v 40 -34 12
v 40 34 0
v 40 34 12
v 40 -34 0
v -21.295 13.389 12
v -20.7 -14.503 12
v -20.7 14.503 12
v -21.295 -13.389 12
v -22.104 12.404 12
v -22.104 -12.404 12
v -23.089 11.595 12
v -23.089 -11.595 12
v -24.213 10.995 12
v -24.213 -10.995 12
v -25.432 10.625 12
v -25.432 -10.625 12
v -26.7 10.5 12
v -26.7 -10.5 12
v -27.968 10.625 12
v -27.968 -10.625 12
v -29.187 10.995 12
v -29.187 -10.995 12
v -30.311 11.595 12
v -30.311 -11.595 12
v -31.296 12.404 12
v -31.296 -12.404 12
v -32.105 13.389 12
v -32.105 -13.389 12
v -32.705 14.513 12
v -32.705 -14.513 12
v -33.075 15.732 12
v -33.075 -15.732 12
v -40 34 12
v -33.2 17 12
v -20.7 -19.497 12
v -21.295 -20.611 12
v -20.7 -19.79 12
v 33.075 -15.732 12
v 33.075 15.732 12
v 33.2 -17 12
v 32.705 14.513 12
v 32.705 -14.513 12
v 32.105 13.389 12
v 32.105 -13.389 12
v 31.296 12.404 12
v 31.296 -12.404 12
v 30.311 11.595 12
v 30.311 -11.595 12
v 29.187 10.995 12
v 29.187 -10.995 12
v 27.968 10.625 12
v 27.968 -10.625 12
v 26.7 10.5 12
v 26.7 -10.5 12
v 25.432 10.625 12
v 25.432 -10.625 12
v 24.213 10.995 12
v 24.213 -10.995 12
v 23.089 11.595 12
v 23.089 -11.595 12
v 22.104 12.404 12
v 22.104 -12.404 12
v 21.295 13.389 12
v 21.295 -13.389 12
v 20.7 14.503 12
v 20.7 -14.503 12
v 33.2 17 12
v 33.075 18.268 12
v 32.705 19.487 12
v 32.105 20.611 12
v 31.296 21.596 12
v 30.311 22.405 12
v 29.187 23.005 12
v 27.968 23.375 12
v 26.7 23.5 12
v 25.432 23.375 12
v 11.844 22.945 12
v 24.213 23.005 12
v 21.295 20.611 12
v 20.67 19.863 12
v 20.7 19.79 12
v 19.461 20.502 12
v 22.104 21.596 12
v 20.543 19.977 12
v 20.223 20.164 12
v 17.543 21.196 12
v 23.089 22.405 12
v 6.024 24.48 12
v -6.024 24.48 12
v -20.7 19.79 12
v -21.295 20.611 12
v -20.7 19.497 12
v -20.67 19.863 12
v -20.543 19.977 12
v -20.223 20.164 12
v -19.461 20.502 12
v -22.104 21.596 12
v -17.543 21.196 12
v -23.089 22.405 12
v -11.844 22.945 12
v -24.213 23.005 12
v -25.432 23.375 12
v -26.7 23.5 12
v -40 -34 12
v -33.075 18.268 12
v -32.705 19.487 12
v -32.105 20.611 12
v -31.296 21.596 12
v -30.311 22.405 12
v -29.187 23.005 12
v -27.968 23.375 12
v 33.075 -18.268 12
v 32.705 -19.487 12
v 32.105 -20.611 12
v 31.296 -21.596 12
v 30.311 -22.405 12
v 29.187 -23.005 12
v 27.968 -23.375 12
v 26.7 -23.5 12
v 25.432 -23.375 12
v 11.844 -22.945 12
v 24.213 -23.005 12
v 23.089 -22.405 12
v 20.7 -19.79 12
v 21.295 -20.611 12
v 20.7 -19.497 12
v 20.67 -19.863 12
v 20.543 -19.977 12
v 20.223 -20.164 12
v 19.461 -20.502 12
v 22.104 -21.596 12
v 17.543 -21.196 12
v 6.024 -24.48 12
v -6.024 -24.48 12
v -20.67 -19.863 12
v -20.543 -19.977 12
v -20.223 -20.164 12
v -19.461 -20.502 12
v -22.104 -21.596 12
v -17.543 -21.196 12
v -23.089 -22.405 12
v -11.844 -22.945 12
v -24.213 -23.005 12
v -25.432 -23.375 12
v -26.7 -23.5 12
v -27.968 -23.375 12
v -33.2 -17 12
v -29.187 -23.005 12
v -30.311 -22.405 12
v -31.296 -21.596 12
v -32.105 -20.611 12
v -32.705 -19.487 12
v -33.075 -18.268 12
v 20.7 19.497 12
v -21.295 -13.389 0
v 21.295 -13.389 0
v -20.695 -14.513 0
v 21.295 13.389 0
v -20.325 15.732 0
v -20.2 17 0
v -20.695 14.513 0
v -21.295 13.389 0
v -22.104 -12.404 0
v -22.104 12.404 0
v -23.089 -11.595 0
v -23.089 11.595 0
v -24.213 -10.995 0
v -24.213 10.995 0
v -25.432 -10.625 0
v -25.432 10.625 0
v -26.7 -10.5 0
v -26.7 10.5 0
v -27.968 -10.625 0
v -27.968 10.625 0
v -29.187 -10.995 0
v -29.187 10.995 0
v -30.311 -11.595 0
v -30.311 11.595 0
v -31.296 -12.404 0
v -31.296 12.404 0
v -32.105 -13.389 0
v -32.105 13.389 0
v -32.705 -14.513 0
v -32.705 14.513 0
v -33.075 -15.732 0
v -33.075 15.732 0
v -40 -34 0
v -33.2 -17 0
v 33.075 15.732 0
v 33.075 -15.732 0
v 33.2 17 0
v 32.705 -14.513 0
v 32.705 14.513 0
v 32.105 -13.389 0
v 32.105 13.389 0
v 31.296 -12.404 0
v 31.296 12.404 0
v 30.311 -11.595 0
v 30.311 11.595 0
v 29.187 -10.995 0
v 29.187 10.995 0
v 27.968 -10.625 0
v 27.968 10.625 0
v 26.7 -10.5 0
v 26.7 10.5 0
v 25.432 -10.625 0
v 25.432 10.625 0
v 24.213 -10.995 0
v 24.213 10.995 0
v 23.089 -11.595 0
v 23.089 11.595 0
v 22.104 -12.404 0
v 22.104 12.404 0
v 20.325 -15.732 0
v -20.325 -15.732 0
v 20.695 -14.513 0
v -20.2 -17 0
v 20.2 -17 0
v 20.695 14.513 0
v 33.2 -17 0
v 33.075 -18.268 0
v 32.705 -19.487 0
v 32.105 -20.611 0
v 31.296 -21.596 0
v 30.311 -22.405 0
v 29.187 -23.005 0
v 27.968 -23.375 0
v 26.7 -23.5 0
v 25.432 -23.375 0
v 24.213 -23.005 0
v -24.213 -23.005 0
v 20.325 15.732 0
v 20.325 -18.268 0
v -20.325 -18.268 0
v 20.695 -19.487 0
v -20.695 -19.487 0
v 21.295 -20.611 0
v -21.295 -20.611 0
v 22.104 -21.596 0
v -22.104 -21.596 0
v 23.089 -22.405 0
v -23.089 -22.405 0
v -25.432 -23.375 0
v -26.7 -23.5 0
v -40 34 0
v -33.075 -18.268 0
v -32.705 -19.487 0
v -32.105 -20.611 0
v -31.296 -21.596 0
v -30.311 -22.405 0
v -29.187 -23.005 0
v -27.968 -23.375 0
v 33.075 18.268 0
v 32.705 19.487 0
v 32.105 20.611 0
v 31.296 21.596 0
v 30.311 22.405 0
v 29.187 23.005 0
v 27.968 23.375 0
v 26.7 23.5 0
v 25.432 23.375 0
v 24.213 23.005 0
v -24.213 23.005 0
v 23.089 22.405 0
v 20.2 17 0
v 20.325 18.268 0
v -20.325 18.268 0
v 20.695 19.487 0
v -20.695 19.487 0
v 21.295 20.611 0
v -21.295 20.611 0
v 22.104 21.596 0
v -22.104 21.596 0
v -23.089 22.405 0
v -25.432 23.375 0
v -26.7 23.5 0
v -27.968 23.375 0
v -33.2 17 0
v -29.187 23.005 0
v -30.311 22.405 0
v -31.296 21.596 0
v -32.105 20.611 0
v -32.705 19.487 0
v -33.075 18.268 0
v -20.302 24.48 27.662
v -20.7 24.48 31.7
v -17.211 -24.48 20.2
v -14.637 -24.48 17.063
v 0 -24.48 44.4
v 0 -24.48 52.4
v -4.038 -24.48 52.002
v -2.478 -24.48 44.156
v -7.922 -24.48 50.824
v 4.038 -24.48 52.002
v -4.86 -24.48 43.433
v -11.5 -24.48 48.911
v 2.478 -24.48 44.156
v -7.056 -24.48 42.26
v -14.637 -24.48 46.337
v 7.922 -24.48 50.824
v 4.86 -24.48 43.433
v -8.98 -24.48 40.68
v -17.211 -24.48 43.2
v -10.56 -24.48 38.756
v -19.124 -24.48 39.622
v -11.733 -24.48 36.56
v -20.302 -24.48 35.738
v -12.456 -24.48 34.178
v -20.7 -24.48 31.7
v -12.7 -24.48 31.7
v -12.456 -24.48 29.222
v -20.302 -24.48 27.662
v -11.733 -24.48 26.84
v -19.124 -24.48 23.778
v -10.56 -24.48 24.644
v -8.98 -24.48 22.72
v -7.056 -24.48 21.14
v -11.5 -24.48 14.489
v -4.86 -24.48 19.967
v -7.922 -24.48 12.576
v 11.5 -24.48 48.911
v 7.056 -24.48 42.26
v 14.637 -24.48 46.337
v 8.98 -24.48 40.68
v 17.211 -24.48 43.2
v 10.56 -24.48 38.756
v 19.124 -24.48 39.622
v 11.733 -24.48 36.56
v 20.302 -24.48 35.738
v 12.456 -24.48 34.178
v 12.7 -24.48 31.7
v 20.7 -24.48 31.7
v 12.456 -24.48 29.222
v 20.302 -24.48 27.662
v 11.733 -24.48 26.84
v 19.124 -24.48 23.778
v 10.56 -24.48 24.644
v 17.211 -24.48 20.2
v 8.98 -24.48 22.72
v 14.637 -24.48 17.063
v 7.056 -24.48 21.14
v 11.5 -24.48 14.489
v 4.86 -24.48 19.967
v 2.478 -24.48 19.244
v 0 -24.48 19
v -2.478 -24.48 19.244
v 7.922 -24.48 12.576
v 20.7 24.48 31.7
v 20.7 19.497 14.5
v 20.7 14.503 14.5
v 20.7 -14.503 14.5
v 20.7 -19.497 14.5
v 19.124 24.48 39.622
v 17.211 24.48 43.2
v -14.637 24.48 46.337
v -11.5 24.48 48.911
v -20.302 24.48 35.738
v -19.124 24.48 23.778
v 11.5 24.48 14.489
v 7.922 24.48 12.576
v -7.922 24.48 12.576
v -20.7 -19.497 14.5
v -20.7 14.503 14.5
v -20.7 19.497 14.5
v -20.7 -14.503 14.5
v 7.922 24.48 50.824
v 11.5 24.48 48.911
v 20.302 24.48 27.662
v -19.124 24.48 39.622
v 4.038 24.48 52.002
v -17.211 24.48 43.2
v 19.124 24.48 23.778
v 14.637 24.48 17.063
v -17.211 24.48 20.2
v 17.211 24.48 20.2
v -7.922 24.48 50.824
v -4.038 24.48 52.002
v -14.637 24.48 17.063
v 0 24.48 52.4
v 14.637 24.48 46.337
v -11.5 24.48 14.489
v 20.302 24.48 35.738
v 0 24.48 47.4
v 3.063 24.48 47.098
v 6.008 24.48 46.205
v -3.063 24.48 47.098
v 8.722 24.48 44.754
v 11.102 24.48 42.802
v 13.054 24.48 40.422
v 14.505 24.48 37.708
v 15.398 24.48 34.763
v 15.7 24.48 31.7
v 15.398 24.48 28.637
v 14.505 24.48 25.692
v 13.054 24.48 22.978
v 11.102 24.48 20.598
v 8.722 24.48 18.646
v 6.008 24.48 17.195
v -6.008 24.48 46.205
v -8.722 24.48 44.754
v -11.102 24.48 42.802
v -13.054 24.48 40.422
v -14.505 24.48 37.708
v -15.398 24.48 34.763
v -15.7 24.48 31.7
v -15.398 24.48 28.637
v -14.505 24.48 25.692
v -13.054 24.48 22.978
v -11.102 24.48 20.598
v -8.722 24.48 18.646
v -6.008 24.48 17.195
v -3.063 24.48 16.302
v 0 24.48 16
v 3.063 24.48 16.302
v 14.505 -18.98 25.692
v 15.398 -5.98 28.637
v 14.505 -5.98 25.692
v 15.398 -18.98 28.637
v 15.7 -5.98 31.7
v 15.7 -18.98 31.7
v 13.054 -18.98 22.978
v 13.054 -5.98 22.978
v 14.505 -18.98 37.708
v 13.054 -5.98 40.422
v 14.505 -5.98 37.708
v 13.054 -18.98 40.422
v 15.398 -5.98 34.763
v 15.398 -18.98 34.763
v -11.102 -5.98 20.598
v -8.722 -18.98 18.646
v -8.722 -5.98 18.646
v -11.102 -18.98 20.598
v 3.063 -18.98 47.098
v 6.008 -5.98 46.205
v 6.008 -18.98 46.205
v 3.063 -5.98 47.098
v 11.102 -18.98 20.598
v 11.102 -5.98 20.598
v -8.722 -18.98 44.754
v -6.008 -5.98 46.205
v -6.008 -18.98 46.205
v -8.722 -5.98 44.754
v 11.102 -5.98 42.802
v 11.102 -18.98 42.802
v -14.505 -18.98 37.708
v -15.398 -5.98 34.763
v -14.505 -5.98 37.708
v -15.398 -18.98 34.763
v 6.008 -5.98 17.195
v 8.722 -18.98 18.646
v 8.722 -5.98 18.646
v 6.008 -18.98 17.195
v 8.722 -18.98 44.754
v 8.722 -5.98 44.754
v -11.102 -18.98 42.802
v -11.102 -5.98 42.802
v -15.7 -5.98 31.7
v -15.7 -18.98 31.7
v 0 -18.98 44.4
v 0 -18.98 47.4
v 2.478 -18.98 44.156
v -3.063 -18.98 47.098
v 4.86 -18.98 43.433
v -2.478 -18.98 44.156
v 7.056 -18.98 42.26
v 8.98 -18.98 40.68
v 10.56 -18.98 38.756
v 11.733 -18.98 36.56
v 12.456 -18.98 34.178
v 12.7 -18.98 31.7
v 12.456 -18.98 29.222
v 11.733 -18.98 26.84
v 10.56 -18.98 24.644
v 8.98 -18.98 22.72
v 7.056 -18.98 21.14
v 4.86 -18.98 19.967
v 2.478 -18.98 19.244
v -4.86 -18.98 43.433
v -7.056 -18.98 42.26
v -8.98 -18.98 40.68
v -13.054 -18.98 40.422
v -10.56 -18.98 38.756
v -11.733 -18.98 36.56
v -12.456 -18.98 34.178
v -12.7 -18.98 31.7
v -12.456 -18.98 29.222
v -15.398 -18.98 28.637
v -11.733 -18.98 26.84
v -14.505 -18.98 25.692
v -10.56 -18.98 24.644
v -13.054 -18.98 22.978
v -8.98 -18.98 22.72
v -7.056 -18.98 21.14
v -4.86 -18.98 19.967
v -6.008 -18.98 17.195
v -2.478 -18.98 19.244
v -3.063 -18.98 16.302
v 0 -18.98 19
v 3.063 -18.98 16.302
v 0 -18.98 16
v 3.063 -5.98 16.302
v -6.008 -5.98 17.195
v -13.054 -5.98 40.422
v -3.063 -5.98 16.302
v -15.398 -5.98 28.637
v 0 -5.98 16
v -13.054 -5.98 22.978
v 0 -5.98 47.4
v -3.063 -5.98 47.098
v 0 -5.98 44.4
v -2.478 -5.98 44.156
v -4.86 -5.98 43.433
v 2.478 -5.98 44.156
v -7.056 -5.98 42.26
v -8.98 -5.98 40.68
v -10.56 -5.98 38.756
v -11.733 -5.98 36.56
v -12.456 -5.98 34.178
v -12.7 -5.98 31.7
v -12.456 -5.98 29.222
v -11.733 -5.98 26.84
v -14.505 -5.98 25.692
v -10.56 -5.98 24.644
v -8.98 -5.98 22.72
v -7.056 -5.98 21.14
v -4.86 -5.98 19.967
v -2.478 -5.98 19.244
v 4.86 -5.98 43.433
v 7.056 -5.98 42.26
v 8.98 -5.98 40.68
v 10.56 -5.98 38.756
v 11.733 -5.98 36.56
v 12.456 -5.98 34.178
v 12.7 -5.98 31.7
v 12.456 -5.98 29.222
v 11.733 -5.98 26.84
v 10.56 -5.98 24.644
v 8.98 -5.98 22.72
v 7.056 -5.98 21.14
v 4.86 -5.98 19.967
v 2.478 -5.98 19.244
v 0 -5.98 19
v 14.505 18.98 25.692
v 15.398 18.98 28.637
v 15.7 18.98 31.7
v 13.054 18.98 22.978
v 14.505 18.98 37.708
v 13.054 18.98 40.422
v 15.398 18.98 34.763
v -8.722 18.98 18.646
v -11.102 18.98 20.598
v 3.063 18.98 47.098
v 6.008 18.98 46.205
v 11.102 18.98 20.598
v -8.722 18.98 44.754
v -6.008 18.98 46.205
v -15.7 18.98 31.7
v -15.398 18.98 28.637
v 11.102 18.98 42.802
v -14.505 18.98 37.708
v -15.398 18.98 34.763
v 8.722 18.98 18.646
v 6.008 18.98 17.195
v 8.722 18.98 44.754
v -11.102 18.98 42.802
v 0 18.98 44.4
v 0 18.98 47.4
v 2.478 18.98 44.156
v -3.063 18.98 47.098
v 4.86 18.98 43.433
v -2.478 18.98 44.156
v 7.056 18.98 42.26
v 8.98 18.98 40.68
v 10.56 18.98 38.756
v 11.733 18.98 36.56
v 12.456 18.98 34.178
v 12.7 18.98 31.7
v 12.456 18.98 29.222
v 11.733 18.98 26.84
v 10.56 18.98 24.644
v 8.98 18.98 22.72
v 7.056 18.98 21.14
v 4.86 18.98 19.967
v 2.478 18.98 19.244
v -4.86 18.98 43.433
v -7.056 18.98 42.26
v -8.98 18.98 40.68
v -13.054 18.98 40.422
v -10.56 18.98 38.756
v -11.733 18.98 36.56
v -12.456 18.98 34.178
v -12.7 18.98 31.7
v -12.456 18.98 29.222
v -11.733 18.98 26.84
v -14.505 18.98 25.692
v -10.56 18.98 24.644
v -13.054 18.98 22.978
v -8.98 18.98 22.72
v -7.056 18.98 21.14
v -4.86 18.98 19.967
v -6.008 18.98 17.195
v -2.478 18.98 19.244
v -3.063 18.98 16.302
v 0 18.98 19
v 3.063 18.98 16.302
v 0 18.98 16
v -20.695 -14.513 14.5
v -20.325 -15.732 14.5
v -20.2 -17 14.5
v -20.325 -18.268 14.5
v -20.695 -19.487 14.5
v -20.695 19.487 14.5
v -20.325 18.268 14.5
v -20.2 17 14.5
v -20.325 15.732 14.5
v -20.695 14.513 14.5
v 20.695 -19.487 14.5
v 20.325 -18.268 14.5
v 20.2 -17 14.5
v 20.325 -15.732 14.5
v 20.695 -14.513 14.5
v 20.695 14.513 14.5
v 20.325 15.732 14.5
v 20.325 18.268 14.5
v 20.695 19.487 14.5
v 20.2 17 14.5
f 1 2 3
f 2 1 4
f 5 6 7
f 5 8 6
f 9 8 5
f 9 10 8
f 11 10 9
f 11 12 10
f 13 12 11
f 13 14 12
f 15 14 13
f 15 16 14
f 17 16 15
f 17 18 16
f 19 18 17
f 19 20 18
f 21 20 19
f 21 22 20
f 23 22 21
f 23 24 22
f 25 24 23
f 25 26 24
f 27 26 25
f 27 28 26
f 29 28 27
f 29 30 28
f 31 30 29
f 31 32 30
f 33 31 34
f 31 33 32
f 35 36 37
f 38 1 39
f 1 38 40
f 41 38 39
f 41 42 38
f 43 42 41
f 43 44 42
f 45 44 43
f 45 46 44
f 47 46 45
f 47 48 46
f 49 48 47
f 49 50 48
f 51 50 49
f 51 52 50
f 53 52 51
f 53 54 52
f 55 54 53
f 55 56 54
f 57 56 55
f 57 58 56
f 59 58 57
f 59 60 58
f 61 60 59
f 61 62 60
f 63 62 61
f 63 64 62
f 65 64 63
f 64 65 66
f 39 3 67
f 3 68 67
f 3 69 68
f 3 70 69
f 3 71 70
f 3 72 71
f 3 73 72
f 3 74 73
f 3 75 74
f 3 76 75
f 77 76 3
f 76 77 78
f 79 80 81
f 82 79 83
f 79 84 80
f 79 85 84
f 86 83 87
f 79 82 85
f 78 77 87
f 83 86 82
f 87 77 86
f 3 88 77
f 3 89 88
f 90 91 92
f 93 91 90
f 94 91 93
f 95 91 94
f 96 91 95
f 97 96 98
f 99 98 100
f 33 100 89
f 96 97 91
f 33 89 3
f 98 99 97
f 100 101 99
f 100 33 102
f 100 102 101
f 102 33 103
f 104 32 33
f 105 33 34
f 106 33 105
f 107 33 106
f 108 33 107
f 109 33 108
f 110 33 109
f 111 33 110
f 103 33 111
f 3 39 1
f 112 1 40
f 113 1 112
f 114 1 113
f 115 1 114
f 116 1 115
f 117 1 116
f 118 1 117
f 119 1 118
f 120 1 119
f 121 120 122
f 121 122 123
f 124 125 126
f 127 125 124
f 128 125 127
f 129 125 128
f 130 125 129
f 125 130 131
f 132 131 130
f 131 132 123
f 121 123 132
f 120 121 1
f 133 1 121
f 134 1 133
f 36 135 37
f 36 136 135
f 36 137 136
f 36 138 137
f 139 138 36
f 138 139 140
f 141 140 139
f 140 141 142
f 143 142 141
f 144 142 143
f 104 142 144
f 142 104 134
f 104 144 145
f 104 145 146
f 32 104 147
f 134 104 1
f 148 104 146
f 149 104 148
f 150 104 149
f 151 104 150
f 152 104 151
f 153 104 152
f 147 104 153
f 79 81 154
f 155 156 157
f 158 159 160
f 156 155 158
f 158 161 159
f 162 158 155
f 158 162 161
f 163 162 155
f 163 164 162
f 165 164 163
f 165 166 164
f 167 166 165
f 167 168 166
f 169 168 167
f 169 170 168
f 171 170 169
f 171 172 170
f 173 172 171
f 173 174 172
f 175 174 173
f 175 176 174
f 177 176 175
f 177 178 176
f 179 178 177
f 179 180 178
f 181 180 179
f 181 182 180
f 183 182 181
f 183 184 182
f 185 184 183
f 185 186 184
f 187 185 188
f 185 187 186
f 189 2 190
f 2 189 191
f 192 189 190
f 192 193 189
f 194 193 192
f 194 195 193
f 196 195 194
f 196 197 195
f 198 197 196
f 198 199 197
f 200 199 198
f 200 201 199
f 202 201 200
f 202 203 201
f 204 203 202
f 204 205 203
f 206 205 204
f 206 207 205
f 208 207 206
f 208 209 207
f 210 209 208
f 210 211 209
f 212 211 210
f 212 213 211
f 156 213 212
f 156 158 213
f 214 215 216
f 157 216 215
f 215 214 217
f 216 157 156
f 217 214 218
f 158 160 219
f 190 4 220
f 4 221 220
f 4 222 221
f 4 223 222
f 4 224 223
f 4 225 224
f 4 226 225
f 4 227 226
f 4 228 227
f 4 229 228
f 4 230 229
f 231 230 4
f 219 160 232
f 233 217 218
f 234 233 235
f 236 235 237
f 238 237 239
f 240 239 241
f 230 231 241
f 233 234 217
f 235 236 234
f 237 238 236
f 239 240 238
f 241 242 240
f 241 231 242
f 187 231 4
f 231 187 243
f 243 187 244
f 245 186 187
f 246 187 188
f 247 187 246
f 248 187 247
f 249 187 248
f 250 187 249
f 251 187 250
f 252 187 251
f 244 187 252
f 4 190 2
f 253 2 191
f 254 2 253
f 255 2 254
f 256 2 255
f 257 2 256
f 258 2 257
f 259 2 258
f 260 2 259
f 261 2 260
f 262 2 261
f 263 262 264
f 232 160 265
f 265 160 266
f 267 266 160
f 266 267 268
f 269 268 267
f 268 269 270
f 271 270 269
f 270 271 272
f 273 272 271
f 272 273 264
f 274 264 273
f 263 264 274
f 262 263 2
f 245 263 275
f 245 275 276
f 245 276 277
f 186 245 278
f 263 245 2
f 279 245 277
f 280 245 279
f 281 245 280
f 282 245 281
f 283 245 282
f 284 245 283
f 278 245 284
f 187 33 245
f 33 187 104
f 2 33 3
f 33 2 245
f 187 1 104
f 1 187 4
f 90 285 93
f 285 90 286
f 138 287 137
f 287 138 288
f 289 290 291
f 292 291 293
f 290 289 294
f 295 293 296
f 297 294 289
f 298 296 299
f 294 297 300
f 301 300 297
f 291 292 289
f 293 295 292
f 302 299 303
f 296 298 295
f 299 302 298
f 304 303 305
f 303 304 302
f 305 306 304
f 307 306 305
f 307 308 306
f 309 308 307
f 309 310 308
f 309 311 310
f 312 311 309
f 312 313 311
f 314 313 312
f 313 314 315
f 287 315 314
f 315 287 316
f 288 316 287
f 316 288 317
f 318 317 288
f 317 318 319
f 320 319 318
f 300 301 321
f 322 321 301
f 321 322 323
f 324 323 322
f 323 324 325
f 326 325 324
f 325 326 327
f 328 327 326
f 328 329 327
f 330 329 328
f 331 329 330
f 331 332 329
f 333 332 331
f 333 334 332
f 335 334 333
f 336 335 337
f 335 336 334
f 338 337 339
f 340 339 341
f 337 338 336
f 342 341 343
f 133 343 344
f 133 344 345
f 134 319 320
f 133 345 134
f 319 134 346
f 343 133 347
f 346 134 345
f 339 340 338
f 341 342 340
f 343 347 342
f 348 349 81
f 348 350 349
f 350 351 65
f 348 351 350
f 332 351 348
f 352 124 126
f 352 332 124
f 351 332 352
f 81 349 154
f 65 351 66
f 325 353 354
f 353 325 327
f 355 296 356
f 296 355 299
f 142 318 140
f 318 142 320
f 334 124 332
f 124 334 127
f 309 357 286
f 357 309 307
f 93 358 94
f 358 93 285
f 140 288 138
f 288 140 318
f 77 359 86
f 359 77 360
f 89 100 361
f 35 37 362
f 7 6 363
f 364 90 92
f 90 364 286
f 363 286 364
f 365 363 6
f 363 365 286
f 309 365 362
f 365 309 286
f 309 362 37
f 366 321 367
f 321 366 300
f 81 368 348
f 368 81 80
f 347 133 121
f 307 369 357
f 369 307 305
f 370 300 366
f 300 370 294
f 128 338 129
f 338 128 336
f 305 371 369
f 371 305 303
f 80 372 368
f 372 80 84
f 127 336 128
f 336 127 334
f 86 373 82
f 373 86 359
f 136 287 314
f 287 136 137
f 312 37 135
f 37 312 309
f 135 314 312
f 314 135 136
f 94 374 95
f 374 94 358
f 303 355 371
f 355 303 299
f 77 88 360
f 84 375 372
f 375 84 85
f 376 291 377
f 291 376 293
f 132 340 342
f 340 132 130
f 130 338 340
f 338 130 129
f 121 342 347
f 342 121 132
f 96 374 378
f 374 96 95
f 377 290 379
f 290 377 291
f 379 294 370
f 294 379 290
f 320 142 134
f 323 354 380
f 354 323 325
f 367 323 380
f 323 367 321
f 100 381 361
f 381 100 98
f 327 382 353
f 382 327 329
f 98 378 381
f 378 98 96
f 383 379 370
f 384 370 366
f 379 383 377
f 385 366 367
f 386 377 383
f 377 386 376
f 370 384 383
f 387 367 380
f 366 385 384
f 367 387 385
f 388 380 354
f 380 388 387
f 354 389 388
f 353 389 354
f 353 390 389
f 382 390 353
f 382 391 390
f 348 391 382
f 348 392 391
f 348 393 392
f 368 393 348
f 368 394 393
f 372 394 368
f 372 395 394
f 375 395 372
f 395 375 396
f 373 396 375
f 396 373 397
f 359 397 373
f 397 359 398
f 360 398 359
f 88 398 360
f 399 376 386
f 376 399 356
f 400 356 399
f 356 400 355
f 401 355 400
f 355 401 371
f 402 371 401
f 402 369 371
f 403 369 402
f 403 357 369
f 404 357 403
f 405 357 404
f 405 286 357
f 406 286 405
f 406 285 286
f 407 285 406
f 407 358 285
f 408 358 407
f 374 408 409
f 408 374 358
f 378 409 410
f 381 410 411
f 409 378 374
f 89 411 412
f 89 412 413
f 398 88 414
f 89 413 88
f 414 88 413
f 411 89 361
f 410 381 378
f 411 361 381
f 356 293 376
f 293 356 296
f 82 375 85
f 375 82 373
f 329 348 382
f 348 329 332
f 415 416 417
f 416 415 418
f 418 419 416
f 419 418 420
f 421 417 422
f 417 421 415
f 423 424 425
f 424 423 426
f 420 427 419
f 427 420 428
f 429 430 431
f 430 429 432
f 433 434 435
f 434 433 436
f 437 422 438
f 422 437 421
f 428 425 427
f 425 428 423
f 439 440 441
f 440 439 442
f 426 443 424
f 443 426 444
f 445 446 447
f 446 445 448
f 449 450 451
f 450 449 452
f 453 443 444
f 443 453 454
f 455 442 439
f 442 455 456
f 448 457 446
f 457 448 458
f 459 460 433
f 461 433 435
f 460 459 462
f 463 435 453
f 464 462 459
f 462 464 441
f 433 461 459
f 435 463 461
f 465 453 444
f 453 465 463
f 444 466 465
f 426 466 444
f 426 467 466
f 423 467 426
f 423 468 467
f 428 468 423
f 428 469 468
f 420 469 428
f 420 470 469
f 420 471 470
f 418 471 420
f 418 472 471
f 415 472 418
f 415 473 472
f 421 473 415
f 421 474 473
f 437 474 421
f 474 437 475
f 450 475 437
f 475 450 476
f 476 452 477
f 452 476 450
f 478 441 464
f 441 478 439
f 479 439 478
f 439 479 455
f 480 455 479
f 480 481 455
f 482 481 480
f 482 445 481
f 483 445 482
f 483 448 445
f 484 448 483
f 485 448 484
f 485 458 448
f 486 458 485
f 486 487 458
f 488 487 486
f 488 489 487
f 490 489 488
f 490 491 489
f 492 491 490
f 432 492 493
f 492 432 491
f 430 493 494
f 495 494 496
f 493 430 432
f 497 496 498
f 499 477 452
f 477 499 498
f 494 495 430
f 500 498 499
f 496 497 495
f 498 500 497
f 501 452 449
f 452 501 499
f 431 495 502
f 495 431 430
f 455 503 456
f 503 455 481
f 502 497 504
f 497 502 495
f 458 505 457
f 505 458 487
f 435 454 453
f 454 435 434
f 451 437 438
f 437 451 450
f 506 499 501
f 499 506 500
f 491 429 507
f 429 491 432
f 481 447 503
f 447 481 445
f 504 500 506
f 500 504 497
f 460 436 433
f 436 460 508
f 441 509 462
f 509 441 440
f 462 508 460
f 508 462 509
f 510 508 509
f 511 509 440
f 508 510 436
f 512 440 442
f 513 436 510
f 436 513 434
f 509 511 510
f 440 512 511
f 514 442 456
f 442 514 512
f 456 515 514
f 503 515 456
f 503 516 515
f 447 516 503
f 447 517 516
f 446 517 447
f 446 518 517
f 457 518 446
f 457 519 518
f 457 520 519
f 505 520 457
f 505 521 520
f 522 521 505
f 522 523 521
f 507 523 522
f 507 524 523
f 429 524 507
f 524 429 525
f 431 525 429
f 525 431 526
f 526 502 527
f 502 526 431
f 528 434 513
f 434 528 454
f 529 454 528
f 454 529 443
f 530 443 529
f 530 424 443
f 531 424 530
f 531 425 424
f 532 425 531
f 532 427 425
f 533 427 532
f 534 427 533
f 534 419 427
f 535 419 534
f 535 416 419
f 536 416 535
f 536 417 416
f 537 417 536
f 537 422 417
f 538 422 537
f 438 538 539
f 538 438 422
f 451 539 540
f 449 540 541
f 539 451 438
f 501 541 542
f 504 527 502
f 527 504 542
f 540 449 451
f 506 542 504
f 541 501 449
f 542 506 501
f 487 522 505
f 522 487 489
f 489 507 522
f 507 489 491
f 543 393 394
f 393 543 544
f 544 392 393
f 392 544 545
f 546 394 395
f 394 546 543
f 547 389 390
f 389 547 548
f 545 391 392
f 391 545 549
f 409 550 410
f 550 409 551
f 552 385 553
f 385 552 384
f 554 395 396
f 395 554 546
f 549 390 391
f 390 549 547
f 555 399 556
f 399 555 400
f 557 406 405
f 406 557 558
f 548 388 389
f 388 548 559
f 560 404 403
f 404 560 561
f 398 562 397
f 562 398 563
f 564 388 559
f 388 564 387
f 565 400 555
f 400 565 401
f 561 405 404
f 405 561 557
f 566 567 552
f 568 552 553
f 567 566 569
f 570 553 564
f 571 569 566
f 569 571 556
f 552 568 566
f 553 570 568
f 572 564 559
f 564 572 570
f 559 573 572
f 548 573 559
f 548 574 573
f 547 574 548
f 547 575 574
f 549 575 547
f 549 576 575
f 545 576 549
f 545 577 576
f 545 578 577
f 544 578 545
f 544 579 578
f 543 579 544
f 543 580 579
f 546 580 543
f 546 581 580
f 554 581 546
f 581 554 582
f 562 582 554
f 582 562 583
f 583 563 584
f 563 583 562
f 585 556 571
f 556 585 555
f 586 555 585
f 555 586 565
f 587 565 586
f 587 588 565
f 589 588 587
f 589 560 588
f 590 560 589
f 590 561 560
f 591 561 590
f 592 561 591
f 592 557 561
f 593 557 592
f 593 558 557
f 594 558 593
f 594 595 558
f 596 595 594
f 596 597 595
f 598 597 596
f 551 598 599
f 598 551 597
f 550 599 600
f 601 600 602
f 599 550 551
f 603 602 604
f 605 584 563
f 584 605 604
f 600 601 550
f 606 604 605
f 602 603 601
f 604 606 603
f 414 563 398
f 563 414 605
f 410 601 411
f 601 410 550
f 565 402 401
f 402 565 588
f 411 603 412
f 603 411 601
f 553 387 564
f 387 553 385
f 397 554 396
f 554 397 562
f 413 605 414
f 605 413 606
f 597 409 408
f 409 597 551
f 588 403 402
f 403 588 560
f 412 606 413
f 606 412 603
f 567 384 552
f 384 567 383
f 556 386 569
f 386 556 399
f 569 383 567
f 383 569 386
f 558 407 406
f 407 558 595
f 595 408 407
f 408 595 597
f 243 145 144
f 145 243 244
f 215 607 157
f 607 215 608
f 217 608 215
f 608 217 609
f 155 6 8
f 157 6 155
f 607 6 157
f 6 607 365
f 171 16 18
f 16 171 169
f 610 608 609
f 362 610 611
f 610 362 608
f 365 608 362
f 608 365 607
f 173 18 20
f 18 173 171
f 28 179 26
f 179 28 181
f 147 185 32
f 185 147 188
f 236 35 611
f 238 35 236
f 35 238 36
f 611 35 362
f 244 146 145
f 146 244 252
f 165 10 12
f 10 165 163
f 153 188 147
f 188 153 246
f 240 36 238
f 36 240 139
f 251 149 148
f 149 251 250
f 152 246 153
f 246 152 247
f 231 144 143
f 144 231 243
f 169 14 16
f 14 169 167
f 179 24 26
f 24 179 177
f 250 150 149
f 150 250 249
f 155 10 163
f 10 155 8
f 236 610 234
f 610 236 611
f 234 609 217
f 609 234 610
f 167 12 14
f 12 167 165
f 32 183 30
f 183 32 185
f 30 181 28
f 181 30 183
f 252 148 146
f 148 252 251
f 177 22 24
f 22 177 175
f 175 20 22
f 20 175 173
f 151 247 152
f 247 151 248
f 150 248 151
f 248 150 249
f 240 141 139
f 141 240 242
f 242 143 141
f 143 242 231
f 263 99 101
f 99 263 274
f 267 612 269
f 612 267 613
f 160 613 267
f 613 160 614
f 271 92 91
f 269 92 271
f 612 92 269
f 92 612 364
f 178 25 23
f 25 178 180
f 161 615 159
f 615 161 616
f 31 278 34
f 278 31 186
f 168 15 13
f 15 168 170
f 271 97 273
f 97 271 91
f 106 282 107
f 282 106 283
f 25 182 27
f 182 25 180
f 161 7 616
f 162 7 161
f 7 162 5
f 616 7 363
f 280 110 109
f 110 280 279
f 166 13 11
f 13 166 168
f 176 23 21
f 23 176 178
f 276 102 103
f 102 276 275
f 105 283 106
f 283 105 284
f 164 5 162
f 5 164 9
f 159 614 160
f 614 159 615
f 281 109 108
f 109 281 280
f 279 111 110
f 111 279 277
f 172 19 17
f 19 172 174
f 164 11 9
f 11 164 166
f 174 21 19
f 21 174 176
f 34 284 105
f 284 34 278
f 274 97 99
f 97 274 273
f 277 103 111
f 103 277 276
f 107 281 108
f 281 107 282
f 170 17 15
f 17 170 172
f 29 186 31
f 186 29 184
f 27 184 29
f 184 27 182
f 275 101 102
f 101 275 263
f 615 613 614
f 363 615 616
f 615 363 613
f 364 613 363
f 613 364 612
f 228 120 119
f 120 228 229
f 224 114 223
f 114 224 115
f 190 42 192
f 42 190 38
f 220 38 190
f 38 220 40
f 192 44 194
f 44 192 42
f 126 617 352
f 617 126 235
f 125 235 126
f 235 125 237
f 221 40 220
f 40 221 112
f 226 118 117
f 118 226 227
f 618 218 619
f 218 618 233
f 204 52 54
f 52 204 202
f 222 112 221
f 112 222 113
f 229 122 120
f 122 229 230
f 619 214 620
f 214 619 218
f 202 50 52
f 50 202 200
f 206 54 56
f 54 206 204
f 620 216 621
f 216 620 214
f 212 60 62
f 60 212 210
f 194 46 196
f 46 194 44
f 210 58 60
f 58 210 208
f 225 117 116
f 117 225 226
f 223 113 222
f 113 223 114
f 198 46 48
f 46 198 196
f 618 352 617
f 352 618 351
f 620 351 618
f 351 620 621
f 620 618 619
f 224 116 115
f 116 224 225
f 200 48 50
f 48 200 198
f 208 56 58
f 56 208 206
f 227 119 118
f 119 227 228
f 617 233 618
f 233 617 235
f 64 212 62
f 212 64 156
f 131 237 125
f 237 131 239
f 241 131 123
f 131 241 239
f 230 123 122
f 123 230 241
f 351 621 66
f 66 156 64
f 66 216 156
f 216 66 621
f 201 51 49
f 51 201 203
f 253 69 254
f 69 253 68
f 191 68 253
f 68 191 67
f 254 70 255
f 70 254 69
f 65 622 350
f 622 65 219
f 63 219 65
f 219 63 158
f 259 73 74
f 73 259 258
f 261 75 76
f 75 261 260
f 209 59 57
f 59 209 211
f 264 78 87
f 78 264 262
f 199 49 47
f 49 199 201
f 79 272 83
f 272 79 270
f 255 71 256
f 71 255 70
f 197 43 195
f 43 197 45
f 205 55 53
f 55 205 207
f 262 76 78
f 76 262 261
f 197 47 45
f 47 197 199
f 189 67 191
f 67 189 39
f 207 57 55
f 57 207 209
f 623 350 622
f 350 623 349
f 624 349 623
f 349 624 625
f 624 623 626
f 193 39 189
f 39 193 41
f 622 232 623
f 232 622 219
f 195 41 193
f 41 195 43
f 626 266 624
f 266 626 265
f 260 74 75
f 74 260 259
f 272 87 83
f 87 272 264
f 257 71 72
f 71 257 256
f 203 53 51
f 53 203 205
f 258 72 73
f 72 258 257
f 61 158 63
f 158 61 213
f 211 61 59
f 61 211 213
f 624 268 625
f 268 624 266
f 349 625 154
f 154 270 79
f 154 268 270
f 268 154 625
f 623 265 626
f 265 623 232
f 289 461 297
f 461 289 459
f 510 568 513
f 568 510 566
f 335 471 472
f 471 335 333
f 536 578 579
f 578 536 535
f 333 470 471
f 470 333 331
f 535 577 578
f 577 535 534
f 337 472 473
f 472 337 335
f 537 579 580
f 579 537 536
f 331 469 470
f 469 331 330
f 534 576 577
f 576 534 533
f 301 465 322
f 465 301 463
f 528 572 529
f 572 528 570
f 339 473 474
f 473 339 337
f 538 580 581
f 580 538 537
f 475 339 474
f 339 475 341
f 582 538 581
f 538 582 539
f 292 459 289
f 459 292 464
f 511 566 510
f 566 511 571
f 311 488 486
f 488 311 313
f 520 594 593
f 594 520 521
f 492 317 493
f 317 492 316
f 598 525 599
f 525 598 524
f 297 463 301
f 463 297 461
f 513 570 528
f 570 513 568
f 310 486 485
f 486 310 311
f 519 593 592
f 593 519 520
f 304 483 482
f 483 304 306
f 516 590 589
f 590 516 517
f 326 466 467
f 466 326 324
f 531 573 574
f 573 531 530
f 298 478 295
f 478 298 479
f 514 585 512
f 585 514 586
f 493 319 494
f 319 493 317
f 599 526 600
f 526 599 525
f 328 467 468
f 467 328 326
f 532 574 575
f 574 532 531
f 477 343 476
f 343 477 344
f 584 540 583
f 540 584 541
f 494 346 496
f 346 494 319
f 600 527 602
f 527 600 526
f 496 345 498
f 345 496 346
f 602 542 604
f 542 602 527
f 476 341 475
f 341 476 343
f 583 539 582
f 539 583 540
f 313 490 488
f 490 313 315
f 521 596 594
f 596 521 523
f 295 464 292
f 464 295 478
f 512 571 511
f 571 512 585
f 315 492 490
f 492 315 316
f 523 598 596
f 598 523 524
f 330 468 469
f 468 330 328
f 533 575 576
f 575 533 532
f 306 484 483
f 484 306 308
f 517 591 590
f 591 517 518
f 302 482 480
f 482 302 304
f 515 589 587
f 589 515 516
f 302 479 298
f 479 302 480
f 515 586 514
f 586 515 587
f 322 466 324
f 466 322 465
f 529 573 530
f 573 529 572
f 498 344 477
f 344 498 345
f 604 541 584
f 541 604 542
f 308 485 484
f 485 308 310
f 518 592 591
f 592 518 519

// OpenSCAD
$fn = 32;

// ----------------------------------------------------------------------
// Bearing block: 80 x 68 mm base, 25.4 mm bore at 31.7 mm
// ----------------------------------------------------------------------

// --- parameters (mm) ---
base_w = 80;              // base width
base_d = 68;              // base depth
base_t = 12;              // base thickness
bore_d = 25.4;            // shaft / bearing bore
house_r = 20.7;           // housing outer radius
house_len = 48.96;        // housing length along the shaft
foot_w = 41.4;            // foot width under the housing
foot_len = 38.96;         // foot length along the shaft
axis_z = 31.7;            // bore axis height above the base
holes_d = 13;             // mounting holes
hole_x = 26.7;            // mounting hole spacing
seat_d = 8;               // bearing seat depth
seat_wall = 3;            // seat wall thickness

difference() {
  union() {
    /* base plate with its underside on z = 0 */
    translate([0, 0, base_t / 2]) cube([base_w, base_d, base_t], center = true);
    /* hull foot: a straight web blending into the round housing */
    hull() {
      translate([0, 0, base_t - 0.5]) cube([foot_w, foot_len, 1.6], center = true);
      translate([0, 0, axis_z]) rotate([-90, 0, 0]) cylinder(h = house_len, d = 2 * house_r, center = true);
    }
  }
  /* bore through the housing, 2.5 mm clear on both sides */
  translate([0, 0, axis_z]) rotate([-90, 0, 0]) cylinder(h = house_len + 5, d = bore_d, center = true);
  /* bearing seats, recessed into both ends of the housing */
  for (sy = [-1, 1]) {
    translate([0, sy * (house_len / 2 - seat_d + 2.5), axis_z]) rotate([-90, 0, 0]) cylinder(h = seat_d + 5, d = bore_d + 2 * seat_wall);
  }
  /* mounting holes through the base plate */
  for (hx = [-26.7, 26.7]) {
    for (hy = [-17, 17]) {
      translate([hx, hy, -2.5]) cylinder(h = base_t + 5, d = holes_d);
    }
  }
}
